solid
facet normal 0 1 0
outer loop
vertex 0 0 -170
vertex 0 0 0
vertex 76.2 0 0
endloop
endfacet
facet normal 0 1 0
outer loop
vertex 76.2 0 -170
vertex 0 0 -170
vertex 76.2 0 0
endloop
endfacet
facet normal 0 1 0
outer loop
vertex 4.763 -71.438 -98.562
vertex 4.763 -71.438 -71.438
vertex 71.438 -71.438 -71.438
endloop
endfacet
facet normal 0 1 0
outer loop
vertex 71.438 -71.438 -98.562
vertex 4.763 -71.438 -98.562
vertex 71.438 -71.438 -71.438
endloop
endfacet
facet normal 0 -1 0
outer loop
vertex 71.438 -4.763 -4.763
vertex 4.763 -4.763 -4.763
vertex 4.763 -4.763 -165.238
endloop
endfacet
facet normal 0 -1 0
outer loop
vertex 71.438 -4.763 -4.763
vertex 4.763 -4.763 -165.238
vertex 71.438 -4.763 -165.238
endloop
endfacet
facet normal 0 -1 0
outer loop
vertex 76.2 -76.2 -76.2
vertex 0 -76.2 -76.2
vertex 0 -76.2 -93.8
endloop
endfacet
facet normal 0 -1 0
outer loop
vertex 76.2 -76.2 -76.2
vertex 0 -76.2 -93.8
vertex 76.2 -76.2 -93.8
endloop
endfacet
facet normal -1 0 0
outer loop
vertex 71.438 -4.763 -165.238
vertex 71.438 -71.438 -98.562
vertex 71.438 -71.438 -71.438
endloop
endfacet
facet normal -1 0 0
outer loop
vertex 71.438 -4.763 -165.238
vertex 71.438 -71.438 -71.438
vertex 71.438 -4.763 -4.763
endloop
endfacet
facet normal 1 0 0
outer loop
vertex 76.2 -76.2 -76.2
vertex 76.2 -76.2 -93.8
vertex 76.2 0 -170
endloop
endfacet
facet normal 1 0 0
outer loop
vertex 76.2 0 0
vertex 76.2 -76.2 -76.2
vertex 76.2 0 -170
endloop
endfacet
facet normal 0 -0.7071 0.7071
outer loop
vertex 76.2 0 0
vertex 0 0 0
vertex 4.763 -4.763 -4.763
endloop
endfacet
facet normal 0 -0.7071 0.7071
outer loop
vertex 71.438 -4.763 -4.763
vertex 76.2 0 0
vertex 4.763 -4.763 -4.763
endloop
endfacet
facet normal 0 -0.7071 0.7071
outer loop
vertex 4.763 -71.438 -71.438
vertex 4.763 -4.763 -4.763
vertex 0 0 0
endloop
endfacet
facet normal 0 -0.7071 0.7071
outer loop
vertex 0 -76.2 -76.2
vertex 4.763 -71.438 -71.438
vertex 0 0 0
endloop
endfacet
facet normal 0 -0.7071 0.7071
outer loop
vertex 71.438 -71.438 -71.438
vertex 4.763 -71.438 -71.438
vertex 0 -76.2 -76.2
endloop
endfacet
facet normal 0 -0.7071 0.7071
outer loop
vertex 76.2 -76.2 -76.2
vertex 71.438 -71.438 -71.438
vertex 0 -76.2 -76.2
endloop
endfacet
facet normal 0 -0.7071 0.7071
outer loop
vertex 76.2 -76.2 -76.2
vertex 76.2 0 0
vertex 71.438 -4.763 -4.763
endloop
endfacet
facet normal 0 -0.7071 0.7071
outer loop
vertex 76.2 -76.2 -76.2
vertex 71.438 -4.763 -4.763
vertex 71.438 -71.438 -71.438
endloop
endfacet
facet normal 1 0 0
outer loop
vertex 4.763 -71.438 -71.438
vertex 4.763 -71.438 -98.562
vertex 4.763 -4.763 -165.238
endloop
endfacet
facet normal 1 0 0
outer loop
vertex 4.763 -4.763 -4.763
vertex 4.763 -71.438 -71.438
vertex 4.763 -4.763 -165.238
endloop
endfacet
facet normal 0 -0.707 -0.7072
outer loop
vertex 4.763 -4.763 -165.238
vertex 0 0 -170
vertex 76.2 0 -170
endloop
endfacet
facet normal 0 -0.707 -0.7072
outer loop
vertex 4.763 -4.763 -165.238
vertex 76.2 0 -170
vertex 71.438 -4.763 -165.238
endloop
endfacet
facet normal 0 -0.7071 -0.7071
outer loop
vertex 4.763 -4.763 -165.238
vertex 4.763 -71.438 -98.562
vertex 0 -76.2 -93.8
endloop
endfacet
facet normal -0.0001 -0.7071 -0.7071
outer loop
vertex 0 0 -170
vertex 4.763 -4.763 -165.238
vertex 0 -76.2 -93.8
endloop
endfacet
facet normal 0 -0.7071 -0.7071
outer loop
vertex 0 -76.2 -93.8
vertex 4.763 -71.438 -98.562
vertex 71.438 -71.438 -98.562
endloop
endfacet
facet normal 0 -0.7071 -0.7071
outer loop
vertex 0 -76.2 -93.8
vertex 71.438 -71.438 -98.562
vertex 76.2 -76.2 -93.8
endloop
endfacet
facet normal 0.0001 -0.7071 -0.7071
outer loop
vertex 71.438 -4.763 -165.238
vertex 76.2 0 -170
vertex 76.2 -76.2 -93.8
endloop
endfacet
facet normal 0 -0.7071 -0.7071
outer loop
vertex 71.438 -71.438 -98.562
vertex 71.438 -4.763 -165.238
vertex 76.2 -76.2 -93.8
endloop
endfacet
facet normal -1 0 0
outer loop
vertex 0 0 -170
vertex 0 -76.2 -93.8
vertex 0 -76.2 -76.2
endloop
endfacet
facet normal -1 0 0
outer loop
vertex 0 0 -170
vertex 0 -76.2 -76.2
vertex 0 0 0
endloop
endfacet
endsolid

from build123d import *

# Parameters (mm, degrees)
CROQUIS2_W              = 76.2
CROQUIS2_H              = 76.2
CROQUIS2_W_2            = 66.675
CROQUIS2_H_2            = 66.675
SALIENTE_EXTRUIR1_DEPTH = 170
CORTAR_EXTRUIR1_REACH   = 203.278


with BuildPart() as part:
    # Croquis2 → Saliente-Extruir1 (new body)
    with BuildSketch(Plane.XY):
        with Locations((38.1, -38.1)):
            Rectangle(CROQUIS2_W, CROQUIS2_H)
        with Locations((38.1, -38.1)):
            Rectangle(CROQUIS2_W_2, CROQUIS2_H_2, mode=Mode.SUBTRACT)
    extrude(amount=-SALIENTE_EXTRUIR1_DEPTH)

    # Cortar-Extruir1: up to this face of the body (flat: up to its plane)
    cortar_extruir1_end = Plane(part.part.faces().sort_by_distance((0, -38.1, -85))[0])
    # Croquis3 → Cortar-Extruir1 (cut, up to the picked face)
    with BuildSketch(Plane(origin=(76.2, 0, 0), x_dir=(0, 0, -1), z_dir=(1, 0, 0)), mode=Mode.PRIVATE) as cortar_extruir1_sk1:
        Polygon((0, 0), (76.2, -76.2), (0, -76.2), align=None)
    cortar_extruir1_tool1 = split(extrude(cortar_extruir1_sk1.sketch, amount=-CORTAR_EXTRUIR1_REACH, mode=Mode.PRIVATE), bisect_by=cortar_extruir1_end, keep=Keep.BOTH, mode=Mode.PRIVATE)
    # Croquis3 → Cortar-Extruir1 (cut, up to the picked face)
    with BuildSketch(Plane(origin=(76.2, 0, 0), x_dir=(0, 0, -1), z_dir=(1, 0, 0)), mode=Mode.PRIVATE) as cortar_extruir1_sk2:
        Polygon((170, 0), (93.8, -76.2), (170, -76.2), align=None)
    cortar_extruir1_tool2 = split(extrude(cortar_extruir1_sk2.sketch, amount=-CORTAR_EXTRUIR1_REACH, mode=Mode.PRIVATE), bisect_by=cortar_extruir1_end, keep=Keep.BOTH, mode=Mode.PRIVATE)
    add(cortar_extruir1_tool1.solids().sort_by(Axis((76.2, -50.8, -25.4), (-1, 0, 0)))[0], mode=Mode.SUBTRACT)
    add(cortar_extruir1_tool2.solids().sort_by(Axis((76.2, -50.8, -144.6), (-1, 0, 0)))[0], mode=Mode.SUBTRACT)


solid = part.part
